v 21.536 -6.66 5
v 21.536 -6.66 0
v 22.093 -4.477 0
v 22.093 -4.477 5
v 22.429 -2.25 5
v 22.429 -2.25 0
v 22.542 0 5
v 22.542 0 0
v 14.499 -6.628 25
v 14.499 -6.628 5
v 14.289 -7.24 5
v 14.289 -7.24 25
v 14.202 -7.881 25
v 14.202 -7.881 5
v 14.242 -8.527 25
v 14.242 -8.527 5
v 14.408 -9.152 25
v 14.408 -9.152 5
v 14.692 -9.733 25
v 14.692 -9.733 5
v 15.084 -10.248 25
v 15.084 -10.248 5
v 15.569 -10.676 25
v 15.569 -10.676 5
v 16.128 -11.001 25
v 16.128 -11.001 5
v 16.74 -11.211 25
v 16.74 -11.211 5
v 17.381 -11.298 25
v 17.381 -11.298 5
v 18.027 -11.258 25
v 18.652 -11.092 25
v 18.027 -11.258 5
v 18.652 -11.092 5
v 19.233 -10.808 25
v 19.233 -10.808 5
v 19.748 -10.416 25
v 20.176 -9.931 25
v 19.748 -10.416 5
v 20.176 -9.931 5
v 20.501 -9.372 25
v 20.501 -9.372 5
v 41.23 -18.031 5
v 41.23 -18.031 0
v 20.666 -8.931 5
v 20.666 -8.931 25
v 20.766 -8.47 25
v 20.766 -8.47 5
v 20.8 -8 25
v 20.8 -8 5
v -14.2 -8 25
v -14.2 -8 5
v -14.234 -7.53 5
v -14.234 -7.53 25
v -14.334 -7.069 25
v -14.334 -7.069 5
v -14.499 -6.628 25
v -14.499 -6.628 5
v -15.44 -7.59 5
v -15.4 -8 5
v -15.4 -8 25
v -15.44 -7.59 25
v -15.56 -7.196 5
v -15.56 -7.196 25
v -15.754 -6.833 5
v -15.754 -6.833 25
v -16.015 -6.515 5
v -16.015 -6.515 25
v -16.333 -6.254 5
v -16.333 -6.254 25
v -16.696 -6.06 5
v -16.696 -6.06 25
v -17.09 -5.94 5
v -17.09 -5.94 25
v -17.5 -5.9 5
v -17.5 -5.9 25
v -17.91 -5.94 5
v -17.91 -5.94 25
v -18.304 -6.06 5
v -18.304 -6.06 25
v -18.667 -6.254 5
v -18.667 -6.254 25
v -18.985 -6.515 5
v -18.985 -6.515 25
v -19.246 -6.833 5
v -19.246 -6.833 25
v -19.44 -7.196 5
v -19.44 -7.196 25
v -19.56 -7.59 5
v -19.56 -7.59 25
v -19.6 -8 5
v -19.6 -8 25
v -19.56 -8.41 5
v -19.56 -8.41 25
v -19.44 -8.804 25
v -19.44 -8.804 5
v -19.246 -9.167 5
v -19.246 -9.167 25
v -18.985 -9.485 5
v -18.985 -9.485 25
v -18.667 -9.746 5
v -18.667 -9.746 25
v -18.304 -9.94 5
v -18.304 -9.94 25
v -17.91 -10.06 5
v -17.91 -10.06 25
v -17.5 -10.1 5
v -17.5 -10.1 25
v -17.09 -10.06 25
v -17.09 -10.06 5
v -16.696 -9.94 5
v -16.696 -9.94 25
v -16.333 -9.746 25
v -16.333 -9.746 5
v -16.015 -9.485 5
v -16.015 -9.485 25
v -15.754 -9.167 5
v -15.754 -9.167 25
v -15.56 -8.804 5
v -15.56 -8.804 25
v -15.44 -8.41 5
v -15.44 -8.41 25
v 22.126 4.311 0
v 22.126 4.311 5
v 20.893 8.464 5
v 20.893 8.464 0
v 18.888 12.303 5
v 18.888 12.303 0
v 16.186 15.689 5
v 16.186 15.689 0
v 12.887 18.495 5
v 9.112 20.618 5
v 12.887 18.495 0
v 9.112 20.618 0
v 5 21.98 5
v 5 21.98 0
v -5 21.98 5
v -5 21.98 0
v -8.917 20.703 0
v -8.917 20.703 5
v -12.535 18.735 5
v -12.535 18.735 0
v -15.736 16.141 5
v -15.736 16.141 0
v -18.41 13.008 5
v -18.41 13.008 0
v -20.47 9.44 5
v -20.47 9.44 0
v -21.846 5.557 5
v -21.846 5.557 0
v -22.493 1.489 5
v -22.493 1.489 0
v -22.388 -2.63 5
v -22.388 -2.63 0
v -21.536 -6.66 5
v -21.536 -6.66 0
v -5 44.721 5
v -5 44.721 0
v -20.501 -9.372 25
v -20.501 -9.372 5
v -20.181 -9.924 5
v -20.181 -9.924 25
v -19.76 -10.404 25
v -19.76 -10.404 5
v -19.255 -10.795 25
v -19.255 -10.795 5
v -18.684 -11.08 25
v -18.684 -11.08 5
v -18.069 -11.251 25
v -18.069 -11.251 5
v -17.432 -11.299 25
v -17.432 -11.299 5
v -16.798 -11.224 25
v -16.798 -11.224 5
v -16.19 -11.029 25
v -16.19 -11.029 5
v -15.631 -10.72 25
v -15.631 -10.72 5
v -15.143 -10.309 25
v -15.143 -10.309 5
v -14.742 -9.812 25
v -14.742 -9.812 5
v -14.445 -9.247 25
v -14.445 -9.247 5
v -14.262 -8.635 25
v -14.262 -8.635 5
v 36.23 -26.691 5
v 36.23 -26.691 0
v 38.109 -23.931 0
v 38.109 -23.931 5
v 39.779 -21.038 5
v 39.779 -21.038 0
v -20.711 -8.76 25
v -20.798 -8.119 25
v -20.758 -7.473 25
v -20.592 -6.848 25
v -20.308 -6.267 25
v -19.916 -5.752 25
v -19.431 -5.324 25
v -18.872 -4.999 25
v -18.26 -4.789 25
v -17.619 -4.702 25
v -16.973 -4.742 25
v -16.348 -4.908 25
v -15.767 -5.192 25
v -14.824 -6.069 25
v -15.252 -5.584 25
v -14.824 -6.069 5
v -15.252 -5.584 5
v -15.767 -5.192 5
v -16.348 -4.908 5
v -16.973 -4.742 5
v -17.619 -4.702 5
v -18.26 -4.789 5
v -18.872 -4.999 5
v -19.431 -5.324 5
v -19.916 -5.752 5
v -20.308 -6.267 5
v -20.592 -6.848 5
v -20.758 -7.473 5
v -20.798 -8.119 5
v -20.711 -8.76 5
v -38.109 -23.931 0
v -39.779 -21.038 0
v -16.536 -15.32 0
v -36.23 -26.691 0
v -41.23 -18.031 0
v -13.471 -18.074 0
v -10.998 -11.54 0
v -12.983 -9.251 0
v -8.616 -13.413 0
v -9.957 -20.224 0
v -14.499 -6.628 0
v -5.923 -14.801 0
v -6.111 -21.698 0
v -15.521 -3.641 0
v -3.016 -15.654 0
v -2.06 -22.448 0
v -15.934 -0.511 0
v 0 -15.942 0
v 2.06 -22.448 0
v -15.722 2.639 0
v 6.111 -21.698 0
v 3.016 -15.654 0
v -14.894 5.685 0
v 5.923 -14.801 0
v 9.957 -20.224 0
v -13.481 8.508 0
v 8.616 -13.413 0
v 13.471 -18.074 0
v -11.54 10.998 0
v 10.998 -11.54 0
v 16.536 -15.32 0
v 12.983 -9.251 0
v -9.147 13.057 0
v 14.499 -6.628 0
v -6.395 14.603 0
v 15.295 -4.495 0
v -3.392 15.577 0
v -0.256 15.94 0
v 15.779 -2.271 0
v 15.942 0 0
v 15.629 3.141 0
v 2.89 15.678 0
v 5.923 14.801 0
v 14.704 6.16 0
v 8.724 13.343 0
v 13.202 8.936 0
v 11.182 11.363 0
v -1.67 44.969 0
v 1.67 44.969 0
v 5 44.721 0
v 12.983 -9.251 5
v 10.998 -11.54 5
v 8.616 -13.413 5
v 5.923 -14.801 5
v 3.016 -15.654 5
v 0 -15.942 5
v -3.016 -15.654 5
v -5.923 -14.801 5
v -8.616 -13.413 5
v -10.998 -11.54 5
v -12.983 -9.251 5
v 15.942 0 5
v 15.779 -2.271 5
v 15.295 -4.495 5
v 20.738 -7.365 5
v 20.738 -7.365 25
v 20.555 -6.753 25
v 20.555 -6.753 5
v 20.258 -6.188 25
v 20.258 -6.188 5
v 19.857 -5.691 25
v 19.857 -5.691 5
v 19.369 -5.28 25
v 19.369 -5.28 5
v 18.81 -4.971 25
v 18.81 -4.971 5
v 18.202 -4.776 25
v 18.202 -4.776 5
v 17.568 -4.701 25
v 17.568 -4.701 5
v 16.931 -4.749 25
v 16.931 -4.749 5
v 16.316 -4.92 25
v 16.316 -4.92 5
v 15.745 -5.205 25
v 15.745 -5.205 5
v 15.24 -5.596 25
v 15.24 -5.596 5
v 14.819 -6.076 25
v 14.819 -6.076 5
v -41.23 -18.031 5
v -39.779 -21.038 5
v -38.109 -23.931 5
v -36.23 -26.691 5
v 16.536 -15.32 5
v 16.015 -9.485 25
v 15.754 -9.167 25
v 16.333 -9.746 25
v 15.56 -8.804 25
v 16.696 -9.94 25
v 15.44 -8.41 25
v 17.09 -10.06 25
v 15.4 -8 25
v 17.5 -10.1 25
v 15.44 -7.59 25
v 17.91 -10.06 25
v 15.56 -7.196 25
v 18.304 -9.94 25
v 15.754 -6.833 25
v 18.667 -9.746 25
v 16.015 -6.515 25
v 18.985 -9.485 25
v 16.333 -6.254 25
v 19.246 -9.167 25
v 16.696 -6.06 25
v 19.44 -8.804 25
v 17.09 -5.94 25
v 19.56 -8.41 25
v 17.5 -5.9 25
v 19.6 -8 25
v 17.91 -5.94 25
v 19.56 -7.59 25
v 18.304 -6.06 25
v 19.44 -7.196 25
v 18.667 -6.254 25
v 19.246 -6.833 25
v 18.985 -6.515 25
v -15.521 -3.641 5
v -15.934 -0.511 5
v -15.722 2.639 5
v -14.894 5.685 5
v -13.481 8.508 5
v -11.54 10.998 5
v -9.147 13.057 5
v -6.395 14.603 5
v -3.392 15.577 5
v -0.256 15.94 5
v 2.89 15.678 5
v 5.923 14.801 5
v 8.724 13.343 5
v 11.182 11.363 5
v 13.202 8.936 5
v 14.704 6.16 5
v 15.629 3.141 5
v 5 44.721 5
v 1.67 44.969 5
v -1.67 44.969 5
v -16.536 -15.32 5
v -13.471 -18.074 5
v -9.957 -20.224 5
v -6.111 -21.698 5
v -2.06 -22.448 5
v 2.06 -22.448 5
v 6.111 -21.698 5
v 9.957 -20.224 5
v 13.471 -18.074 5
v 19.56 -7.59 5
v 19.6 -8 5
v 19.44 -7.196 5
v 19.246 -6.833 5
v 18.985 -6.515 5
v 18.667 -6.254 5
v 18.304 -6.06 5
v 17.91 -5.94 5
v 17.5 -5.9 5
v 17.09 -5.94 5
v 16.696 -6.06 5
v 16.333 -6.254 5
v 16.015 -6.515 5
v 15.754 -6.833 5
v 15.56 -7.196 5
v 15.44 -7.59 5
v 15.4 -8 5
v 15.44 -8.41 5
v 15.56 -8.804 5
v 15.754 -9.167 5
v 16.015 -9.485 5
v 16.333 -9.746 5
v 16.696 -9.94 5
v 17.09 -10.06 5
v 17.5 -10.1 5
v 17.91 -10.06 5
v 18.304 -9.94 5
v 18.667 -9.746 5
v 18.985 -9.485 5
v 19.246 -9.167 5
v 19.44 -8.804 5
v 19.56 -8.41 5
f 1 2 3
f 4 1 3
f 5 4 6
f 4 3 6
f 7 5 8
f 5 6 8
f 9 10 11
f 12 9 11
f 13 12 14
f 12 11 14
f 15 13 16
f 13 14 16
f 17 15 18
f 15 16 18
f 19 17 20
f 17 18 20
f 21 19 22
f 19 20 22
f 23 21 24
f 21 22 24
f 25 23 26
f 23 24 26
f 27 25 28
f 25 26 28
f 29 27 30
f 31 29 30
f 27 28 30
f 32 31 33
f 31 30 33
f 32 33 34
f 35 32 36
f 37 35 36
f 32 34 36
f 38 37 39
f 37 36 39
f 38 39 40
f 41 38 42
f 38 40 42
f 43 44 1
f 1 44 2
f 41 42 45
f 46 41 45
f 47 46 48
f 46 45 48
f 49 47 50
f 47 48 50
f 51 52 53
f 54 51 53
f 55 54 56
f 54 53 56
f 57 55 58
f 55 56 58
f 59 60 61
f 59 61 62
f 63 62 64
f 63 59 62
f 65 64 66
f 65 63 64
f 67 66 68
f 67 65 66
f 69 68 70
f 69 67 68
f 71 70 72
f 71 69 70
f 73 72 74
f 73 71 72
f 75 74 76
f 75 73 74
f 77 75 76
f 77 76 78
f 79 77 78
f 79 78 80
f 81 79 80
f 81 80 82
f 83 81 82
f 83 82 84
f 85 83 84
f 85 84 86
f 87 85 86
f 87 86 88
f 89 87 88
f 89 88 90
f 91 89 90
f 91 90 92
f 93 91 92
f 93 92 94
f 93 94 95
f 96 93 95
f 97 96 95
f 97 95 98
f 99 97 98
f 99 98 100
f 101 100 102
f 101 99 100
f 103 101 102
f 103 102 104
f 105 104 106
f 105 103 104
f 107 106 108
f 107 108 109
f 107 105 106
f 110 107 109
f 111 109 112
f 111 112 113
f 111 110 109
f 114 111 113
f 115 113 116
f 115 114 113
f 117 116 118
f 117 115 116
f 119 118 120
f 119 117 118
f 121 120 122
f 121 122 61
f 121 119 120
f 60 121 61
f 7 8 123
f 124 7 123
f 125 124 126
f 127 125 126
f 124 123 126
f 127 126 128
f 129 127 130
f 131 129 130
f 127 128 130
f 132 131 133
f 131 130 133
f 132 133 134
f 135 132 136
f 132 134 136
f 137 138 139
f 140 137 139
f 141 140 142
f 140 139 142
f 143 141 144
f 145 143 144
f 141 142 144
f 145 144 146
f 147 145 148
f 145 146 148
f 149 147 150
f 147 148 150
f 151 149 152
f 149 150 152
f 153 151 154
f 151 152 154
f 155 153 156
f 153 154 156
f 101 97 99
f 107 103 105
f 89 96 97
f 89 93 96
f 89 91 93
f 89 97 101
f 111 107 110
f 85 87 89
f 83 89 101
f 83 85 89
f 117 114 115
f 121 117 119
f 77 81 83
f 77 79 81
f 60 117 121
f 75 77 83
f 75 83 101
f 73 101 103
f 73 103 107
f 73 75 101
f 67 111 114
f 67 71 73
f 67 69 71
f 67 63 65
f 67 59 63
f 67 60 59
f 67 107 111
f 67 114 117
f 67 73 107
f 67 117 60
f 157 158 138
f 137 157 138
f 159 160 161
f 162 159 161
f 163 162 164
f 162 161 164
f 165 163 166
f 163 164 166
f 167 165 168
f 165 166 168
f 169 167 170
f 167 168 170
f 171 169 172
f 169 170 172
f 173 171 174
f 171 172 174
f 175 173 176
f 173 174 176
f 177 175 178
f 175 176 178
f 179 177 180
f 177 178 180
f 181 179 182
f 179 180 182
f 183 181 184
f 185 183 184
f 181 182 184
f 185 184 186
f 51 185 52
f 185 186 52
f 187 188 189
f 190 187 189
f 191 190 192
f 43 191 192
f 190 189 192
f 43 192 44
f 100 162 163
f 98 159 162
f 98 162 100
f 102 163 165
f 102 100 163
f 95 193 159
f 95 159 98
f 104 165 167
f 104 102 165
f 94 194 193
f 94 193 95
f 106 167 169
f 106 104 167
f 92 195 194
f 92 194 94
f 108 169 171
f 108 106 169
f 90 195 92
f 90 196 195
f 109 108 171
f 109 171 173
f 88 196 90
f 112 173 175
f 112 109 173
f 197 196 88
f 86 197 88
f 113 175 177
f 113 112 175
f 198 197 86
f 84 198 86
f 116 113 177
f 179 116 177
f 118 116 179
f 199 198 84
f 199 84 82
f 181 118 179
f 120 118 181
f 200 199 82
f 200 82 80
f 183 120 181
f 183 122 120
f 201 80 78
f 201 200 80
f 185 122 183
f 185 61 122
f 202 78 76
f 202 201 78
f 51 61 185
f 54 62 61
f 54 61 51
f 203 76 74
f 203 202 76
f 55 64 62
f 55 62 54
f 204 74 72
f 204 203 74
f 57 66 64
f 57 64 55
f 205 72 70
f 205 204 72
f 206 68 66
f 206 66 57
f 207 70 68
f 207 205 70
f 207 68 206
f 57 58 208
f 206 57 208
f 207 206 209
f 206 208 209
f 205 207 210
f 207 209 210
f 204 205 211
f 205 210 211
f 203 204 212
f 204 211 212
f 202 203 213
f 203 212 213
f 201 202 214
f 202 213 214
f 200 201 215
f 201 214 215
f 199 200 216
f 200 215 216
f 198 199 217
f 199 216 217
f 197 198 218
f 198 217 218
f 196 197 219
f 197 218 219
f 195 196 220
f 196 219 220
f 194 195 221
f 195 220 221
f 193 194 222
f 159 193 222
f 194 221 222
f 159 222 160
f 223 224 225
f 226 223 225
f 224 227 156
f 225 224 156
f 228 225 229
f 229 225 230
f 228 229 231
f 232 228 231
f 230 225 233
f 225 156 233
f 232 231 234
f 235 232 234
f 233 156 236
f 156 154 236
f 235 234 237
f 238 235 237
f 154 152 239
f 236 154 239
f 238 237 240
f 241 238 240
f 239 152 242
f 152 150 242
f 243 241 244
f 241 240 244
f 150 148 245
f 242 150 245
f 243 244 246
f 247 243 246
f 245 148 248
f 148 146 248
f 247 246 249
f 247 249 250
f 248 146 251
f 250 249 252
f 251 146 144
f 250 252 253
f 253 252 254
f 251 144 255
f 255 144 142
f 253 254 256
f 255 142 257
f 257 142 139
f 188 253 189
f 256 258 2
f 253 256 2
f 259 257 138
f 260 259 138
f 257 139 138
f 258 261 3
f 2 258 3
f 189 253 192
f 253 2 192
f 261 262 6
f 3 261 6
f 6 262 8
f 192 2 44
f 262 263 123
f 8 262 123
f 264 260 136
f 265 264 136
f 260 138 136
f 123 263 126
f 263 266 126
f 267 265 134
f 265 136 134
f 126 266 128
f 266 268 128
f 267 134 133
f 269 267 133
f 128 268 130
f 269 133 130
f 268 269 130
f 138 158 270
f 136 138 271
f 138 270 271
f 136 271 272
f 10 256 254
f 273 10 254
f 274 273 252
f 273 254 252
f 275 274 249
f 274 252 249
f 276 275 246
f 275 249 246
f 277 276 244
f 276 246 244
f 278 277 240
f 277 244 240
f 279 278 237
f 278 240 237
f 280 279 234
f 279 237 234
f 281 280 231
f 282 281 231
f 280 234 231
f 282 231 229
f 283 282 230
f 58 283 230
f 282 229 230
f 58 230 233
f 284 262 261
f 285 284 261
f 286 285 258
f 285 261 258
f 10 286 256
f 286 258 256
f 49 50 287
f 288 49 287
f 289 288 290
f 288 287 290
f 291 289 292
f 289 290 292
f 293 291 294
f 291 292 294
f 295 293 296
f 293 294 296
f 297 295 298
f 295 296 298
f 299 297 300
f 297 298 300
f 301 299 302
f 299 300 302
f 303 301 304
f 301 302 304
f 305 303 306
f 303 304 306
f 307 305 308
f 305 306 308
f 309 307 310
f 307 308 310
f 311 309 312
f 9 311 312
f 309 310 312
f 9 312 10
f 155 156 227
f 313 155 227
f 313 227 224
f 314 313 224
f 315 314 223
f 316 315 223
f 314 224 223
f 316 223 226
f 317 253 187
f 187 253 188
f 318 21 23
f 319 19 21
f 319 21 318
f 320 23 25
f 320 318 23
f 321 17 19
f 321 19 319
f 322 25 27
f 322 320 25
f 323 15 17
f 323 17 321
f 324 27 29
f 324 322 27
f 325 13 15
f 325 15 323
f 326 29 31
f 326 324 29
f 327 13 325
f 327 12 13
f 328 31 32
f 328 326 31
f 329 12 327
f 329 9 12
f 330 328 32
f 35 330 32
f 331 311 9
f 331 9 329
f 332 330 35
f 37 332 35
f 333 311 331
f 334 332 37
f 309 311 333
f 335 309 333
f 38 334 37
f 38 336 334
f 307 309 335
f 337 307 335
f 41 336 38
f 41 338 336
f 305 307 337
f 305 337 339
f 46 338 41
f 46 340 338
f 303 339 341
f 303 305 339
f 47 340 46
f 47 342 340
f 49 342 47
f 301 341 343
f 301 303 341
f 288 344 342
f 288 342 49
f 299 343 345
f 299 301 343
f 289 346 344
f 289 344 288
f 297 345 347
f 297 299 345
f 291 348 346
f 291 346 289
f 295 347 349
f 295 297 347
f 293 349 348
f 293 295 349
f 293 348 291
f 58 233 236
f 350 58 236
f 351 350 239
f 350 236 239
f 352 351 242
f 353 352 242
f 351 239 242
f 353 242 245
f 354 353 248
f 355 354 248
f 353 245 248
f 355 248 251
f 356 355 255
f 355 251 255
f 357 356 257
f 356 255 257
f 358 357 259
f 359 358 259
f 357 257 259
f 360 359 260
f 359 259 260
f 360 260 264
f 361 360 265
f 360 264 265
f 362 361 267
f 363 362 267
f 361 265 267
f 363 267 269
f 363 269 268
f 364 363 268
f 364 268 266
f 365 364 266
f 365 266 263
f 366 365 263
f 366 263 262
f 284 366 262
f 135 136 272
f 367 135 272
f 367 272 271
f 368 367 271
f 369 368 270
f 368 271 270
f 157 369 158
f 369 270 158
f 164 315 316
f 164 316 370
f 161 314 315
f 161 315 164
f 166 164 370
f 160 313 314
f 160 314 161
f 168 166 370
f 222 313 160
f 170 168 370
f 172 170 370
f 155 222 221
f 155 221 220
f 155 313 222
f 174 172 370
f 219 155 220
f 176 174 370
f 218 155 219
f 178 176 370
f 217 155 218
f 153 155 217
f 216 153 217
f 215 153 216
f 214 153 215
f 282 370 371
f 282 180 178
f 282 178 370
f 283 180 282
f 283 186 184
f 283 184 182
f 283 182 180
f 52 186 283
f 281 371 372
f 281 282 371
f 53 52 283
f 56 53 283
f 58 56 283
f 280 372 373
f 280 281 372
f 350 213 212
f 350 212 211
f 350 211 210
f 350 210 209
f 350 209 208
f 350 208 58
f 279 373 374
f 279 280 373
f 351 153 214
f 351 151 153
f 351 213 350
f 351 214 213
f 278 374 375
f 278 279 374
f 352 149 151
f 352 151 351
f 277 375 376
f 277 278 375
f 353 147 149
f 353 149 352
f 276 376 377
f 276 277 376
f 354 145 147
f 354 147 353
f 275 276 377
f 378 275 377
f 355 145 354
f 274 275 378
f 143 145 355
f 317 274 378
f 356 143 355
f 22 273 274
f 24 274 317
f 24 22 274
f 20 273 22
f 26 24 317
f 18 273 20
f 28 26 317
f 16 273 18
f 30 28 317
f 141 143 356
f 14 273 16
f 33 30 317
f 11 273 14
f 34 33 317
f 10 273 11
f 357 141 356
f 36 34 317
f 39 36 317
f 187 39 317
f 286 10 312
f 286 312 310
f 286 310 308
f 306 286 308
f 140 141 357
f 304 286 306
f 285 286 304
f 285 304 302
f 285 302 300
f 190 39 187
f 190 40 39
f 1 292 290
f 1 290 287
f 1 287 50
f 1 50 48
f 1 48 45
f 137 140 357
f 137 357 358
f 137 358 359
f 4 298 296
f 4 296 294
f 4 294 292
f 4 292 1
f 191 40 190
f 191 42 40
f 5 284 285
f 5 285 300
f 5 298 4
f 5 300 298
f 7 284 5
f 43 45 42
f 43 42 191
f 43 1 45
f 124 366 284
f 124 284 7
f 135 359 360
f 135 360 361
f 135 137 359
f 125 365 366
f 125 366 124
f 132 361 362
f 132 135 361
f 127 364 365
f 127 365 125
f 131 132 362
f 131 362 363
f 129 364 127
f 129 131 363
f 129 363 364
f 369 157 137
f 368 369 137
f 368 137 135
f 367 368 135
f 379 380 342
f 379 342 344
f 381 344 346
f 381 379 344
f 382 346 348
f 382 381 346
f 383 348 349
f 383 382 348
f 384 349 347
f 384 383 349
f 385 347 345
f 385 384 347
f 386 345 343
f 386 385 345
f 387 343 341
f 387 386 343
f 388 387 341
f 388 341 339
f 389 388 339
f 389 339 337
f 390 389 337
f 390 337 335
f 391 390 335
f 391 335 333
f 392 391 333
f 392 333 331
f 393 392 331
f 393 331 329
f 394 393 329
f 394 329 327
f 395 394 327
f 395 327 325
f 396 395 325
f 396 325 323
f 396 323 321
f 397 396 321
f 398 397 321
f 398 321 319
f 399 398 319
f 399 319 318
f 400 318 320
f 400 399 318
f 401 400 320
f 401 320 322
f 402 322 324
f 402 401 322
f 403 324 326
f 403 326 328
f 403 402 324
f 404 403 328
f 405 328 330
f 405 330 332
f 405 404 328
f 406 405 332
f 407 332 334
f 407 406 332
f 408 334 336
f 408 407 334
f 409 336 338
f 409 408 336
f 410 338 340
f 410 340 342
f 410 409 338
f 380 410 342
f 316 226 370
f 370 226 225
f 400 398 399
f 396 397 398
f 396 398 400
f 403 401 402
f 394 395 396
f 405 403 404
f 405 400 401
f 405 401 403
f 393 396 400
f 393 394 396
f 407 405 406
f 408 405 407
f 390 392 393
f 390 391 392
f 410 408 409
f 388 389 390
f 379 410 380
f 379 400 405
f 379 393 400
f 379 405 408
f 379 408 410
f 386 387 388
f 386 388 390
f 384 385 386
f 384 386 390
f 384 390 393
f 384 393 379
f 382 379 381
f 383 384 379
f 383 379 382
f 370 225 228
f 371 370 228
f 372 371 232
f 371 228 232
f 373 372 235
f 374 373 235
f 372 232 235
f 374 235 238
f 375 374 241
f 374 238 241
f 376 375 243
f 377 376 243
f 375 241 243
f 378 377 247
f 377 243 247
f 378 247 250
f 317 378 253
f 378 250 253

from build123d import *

# Parameters (mm, degrees)
F0_R     = 2.1
F1_DEPTH = 5
F2_DEPTH = 25


with BuildPart() as f1:
    # F0 (on Top) → F1 (new body)
    with BuildSketch(Plane.XY):
        with BuildLine():
            ThreePointArc((-16.535554, -15.320309), (-18.755721, -12.504373), (-20.501266, -9.372007))
            ThreePointArc((-20.501266, -9.372007), (-21.062104, -8.032695), (-21.535554, -6.660055))
            Line((-21.535554, -6.660055), (-41.229833, -18.030553))
            ThreePointArc((-41.229833, -18.030553), (-38.971143, -22.5), (-36.229833, -26.690807))
            Line((-36.229833, -26.690807), (-16.535554, -15.320309))
        make_face()
        with BuildLine():
            Line((-5, 44.72136), (-5, 21.980364))
            ThreePointArc((-5, 21.980364), (0, 22.541881), (5, 21.980364))
            Line((5, 21.980364), (5, 44.72136))
            ThreePointArc((5, 44.72136), (0, 45), (-5, 44.72136))
        make_face()
        with BuildLine():
            ThreePointArc((21.535554, -6.660055), (21.062104, -8.032695), (20.501266, -9.372007))
            ThreePointArc((20.501266, -9.372007), (18.755721, -12.504373), (16.535554, -15.320309))
            Line((16.535554, -15.320309), (36.229833, -26.690807))
            ThreePointArc((36.229833, -26.690807), (38.971143, -22.5), (41.229833, -18.030553))
            Line((41.229833, -18.030553), (21.535554, -6.660055))
        make_face()
        with BuildLine():
            ThreePointArc((-20.501266, -9.372007), (-18.872007, -4.998734), (-14.498734, -6.627993))
            ThreePointArc((-14.498734, -6.627993), (-3.391643, 15.576917), (15.941881, 0))
            ThreePointArc((15.941881, 0), (15.576917, -3.391643), (14.498734, -6.627993))
            ThreePointArc((14.498734, -6.627993), (18.202077, -4.775548), (20.8, -8))
            ThreePointArc((20.8, -8), (20.724452, -8.702077), (20.501266, -9.372007))
            ThreePointArc((20.501266, -9.372007), (21.062104, -8.032695), (21.535554, -6.660055))
            ThreePointArc((21.535554, -6.660055), (22.28888, -3.367827), (22.541881, 0))
            ThreePointArc((22.541881, 0), (17.618823, 14.061063), (5, 21.980364))
            ThreePointArc((5, 21.980364), (0, 22.541881), (-5, 21.980364))
            ThreePointArc((-5, 21.980364), (-19.521842, 11.270941), (-21.535554, -6.660055))
            ThreePointArc((-21.535554, -6.660055), (-21.062104, -8.032695), (-20.501266, -9.372007))
        make_face()
        with BuildLine():
            ThreePointArc((20.8, -8), (18.202077, -4.775548), (14.498734, -6.627993))
            ThreePointArc((14.498734, -6.627993), (16.127993, -11.001266), (20.501266, -9.372007))
            ThreePointArc((20.501266, -9.372007), (20.724452, -8.702077), (20.8, -8))
        make_face()
        with Locations((17.5, -8)):
            Circle(F0_R, mode=Mode.SUBTRACT)
        with Locations((17.5, -8)):
            Circle(F0_R)
        with BuildLine():
            ThreePointArc((-14.498734, -6.627993), (-14.275548, -7.297923), (-14.2, -8))
            ThreePointArc((-14.2, -8), (-16.797924, -11.224452), (-20.501266, -9.372007))
            ThreePointArc((-20.501266, -9.372007), (-18.755721, -12.504373), (-16.535554, -15.320309))
            ThreePointArc((-16.535554, -15.320309), (0, -22.541881), (16.535554, -15.320309))
            ThreePointArc((16.535554, -15.320309), (18.755721, -12.504373), (20.501266, -9.372007))
            ThreePointArc((20.501266, -9.372007), (16.127993, -11.001266), (14.498734, -6.627993))
            ThreePointArc((14.498734, -6.627993), (0, -15.941881), (-14.498734, -6.627993))
        make_face()
        with BuildLine():
            ThreePointArc((-20.501266, -9.372007), (-16.797924, -11.224452), (-14.2, -8))
            ThreePointArc((-14.2, -8), (-14.275548, -7.297923), (-14.498734, -6.627993))
            ThreePointArc((-14.498734, -6.627993), (-18.872007, -4.998734), (-20.501266, -9.372007))
        make_face()
        with Locations((-17.5, -8)):
            Circle(F0_R, mode=Mode.SUBTRACT)
        with Locations((-17.5, -8)):
            Circle(F0_R)
    extrude(amount=F1_DEPTH)

    # F0 (on Top) → F2 (join)
    with BuildSketch(Plane.XY):
        with BuildLine():
            ThreePointArc((-20.501266, -9.372007), (-16.797924, -11.224452), (-14.2, -8))
            ThreePointArc((-14.2, -8), (-14.275548, -7.297923), (-14.498734, -6.627993))
            ThreePointArc((-14.498734, -6.627993), (-18.872007, -4.998734), (-20.501266, -9.372007))
        make_face()
        with Locations((-17.5, -8)):
            Circle(F0_R, mode=Mode.SUBTRACT)
        with BuildLine():
            ThreePointArc((20.8, -8), (18.202077, -4.775548), (14.498734, -6.627993))
            ThreePointArc((14.498734, -6.627993), (16.127993, -11.001266), (20.501266, -9.372007))
            ThreePointArc((20.501266, -9.372007), (20.724452, -8.702077), (20.8, -8))
        make_face()
        with Locations((17.5, -8)):
            Circle(F0_R, mode=Mode.SUBTRACT)
    extrude(amount=F2_DEPTH)


solid = f1.part
